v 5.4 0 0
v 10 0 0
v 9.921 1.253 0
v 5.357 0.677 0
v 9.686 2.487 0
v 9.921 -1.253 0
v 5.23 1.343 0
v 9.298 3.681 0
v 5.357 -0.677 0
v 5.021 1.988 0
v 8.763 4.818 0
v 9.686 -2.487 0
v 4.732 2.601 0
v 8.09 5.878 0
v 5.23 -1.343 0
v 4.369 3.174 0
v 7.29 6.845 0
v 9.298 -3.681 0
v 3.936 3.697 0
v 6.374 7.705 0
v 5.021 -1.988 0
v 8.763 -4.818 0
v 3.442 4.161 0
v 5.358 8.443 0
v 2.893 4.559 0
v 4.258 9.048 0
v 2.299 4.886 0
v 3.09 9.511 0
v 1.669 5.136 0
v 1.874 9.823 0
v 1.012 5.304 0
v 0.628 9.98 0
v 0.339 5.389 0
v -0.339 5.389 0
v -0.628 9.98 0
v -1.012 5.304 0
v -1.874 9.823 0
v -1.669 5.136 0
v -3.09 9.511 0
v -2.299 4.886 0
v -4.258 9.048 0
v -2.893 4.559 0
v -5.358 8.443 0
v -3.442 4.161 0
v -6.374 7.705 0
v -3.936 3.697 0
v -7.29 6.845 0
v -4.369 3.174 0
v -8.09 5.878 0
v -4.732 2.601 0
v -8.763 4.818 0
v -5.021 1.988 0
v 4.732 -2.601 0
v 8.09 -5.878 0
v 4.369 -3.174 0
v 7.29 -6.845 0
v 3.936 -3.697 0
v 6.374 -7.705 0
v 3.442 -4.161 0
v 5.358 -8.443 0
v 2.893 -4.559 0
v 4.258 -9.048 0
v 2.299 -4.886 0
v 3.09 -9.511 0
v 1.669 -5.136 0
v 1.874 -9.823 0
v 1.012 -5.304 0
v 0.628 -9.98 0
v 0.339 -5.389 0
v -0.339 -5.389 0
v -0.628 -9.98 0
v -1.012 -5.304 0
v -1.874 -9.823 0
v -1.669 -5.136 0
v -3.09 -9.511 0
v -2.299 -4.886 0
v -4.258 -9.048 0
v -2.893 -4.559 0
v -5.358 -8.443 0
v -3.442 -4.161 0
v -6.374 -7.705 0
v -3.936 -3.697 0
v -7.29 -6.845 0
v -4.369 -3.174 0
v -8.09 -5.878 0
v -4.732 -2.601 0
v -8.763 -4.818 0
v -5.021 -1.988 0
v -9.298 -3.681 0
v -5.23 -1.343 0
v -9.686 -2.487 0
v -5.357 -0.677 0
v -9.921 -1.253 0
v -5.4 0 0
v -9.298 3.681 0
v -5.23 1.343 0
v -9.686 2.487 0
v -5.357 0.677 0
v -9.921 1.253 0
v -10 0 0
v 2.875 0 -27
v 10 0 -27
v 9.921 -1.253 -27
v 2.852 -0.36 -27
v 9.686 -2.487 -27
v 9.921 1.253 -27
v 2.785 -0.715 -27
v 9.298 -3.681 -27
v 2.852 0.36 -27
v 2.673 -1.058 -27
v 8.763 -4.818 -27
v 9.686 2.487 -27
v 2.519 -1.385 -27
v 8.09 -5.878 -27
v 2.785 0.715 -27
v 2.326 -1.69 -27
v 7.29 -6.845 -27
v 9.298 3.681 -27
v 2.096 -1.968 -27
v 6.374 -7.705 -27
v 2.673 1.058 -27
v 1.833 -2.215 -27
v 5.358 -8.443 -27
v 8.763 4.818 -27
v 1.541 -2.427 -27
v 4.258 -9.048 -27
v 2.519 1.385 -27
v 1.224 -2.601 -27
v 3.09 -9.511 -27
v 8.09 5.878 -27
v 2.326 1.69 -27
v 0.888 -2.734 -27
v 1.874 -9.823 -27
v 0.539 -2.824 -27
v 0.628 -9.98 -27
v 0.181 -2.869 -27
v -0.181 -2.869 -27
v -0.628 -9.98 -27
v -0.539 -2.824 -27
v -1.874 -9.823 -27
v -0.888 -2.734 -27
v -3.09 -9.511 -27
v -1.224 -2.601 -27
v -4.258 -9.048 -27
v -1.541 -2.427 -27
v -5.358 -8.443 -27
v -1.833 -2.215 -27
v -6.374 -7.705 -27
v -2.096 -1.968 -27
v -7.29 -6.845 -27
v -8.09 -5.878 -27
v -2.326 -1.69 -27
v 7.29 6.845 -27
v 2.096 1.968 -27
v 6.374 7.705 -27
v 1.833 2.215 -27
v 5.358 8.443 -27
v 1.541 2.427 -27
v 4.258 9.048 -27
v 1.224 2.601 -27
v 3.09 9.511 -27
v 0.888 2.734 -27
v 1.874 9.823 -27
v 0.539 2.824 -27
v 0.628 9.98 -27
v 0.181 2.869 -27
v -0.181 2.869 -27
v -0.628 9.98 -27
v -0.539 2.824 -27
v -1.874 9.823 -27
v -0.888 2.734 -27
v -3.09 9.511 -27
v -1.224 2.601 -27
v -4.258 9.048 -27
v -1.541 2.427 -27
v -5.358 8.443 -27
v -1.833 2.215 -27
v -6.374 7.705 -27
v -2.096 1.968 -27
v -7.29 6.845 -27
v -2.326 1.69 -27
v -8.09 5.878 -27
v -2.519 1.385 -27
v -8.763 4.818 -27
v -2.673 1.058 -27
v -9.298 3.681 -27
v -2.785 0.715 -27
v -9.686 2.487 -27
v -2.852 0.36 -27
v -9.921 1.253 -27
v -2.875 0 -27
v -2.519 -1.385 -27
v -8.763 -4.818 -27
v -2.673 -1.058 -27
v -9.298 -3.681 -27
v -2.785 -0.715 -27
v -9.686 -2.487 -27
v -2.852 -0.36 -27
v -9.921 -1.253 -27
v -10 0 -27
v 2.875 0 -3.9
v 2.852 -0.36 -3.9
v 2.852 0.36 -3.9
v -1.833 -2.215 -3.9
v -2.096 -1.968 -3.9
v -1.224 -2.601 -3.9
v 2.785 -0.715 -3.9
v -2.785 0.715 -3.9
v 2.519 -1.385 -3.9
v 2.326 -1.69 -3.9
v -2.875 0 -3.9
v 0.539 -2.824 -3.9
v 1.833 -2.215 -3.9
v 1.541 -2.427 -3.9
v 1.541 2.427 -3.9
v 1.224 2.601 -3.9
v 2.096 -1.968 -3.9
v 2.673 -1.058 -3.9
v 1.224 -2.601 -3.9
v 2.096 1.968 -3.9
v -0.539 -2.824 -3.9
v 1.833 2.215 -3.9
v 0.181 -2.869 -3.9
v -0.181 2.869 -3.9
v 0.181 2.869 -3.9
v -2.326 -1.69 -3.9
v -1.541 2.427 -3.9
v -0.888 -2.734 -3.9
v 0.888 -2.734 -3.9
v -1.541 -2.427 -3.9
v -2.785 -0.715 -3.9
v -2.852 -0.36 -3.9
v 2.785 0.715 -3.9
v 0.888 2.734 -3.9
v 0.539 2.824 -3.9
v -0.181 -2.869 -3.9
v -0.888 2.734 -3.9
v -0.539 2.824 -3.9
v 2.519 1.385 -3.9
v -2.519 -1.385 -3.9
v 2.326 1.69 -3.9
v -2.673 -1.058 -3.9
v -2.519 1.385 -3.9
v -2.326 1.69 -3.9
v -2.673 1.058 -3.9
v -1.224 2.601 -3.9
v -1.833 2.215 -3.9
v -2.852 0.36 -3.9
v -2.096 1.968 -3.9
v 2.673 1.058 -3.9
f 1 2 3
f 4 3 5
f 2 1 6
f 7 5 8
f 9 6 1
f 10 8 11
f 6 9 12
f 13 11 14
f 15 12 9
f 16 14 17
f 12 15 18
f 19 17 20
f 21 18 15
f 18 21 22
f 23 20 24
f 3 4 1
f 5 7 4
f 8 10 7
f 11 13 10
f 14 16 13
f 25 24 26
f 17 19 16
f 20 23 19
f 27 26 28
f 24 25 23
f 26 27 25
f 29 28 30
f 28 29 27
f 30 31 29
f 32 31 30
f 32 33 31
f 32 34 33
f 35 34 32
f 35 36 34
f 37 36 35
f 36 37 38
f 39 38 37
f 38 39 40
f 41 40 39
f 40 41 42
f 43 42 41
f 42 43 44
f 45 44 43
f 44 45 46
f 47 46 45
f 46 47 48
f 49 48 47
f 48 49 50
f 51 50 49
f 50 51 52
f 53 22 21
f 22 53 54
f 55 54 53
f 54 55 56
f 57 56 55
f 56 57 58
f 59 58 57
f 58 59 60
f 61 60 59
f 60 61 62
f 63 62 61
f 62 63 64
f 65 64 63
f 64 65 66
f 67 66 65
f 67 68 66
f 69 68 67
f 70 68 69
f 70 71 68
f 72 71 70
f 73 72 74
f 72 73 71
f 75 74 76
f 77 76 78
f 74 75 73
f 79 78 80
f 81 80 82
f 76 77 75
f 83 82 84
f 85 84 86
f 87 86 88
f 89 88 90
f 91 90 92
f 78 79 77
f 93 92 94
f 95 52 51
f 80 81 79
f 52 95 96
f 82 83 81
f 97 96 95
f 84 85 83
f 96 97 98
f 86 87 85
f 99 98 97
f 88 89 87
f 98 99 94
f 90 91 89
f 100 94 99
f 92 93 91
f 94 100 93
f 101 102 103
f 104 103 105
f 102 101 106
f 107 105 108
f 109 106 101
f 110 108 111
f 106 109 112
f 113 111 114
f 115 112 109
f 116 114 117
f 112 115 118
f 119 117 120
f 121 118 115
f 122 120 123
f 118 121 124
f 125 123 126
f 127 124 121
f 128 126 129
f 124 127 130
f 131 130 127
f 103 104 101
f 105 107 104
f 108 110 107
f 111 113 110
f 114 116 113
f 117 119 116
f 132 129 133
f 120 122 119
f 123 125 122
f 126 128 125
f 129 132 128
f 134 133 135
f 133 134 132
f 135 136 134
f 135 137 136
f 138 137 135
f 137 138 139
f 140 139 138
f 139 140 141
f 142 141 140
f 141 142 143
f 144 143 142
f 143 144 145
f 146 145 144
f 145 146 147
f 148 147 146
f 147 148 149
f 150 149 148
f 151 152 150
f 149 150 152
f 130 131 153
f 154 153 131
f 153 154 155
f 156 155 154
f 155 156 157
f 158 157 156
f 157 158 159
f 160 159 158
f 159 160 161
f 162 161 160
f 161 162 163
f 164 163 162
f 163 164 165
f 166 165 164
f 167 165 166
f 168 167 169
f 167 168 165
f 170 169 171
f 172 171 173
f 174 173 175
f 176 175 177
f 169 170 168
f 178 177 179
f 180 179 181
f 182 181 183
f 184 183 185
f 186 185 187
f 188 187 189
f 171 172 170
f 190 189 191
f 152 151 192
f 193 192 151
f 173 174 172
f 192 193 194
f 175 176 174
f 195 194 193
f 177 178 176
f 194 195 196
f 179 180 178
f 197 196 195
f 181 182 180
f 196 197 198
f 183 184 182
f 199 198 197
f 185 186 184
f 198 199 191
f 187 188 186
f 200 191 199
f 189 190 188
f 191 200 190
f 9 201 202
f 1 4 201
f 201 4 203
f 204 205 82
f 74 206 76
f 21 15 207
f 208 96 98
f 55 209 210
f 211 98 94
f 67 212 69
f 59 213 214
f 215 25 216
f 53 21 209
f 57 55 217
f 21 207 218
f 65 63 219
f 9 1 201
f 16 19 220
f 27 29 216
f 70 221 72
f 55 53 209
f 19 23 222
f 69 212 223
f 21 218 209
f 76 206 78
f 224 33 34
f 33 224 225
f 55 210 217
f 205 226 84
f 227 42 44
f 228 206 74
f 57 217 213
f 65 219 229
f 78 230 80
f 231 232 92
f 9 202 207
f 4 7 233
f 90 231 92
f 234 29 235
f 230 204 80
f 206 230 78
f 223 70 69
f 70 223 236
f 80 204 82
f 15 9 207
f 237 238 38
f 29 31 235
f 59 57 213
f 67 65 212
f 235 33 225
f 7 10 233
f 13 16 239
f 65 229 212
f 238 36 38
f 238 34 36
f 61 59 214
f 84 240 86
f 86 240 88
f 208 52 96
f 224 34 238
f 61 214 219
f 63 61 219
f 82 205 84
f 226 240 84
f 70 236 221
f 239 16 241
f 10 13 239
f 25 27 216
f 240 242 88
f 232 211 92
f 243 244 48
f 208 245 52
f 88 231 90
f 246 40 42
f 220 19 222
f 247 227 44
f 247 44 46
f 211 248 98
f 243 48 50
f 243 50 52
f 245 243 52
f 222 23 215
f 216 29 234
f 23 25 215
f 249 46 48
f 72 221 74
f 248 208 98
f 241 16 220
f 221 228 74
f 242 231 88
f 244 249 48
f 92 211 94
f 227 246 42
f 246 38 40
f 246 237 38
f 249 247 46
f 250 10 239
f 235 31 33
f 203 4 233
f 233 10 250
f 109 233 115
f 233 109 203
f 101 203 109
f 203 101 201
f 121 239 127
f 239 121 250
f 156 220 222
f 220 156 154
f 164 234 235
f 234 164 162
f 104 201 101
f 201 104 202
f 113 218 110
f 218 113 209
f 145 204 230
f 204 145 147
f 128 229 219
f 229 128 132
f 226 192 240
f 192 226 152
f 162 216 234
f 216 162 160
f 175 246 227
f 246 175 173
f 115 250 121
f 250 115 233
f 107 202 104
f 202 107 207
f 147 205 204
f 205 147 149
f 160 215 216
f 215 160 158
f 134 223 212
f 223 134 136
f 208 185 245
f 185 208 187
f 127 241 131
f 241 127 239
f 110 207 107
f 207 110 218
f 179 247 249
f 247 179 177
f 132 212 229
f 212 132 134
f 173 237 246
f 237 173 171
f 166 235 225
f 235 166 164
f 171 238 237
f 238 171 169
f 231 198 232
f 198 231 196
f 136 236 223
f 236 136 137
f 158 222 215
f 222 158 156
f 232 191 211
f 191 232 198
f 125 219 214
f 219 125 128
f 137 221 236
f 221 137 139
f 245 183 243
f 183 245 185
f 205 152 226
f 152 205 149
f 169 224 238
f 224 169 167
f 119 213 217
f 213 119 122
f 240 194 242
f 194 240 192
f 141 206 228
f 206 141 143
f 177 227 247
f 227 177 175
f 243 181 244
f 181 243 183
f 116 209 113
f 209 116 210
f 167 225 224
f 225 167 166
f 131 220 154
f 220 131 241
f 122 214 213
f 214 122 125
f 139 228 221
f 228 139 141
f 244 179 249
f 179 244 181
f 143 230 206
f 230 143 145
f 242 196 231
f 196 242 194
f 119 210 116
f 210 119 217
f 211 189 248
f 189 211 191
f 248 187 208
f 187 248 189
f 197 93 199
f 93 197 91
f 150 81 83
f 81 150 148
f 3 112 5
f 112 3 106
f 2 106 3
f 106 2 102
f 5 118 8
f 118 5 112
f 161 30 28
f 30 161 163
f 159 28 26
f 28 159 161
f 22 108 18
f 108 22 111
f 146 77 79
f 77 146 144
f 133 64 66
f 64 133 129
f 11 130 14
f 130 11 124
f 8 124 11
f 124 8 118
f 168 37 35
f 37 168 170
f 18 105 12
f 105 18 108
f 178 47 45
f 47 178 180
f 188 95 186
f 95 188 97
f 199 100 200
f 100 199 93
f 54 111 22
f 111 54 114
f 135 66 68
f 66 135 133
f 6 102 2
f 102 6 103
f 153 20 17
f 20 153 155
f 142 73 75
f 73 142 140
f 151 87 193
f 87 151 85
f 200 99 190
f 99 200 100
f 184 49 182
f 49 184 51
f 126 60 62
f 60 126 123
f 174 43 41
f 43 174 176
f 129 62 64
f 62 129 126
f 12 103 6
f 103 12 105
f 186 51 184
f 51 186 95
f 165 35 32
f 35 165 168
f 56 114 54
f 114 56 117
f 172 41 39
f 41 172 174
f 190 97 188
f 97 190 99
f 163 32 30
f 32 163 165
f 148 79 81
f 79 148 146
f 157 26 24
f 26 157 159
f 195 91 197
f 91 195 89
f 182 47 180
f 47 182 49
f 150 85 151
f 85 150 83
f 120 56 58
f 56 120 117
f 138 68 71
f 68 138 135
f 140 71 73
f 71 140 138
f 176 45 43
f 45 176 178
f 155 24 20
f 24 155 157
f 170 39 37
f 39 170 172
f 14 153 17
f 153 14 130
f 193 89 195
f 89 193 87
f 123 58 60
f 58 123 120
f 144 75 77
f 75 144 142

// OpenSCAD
$fn = 50;


difference() {
	union() {
		translate(v = [0, 0, -27.0000000000]) {
			cylinder(h = 27, r = 10.0000000000);
		}
	}
	union() {
		translate(v = [0, 0, 0]) {
			rotate(a = [0, 0, 0]) {
				difference() {
					union() {
						#translate(v = [0, 0, -27.0000000000]) {
							cylinder(h = 27, r = 2.6000000000);
						}
						#translate(v = [0, 0, -3.9000000000]) {
							cylinder(h = 3.9000000000, r1 = 2.8750000000, r2 = 5.4000000000);
						}
						#translate(v = [0, 0, -27.0000000000]) {
							cylinder(h = 27, r = 2.8750000000);
						}
						#translate(v = [0, 0, -27.0000000000]) {
							cylinder(h = 27, r = 2.6000000000);
						}
					}
					union();
				}
			}
		}
	}
}
